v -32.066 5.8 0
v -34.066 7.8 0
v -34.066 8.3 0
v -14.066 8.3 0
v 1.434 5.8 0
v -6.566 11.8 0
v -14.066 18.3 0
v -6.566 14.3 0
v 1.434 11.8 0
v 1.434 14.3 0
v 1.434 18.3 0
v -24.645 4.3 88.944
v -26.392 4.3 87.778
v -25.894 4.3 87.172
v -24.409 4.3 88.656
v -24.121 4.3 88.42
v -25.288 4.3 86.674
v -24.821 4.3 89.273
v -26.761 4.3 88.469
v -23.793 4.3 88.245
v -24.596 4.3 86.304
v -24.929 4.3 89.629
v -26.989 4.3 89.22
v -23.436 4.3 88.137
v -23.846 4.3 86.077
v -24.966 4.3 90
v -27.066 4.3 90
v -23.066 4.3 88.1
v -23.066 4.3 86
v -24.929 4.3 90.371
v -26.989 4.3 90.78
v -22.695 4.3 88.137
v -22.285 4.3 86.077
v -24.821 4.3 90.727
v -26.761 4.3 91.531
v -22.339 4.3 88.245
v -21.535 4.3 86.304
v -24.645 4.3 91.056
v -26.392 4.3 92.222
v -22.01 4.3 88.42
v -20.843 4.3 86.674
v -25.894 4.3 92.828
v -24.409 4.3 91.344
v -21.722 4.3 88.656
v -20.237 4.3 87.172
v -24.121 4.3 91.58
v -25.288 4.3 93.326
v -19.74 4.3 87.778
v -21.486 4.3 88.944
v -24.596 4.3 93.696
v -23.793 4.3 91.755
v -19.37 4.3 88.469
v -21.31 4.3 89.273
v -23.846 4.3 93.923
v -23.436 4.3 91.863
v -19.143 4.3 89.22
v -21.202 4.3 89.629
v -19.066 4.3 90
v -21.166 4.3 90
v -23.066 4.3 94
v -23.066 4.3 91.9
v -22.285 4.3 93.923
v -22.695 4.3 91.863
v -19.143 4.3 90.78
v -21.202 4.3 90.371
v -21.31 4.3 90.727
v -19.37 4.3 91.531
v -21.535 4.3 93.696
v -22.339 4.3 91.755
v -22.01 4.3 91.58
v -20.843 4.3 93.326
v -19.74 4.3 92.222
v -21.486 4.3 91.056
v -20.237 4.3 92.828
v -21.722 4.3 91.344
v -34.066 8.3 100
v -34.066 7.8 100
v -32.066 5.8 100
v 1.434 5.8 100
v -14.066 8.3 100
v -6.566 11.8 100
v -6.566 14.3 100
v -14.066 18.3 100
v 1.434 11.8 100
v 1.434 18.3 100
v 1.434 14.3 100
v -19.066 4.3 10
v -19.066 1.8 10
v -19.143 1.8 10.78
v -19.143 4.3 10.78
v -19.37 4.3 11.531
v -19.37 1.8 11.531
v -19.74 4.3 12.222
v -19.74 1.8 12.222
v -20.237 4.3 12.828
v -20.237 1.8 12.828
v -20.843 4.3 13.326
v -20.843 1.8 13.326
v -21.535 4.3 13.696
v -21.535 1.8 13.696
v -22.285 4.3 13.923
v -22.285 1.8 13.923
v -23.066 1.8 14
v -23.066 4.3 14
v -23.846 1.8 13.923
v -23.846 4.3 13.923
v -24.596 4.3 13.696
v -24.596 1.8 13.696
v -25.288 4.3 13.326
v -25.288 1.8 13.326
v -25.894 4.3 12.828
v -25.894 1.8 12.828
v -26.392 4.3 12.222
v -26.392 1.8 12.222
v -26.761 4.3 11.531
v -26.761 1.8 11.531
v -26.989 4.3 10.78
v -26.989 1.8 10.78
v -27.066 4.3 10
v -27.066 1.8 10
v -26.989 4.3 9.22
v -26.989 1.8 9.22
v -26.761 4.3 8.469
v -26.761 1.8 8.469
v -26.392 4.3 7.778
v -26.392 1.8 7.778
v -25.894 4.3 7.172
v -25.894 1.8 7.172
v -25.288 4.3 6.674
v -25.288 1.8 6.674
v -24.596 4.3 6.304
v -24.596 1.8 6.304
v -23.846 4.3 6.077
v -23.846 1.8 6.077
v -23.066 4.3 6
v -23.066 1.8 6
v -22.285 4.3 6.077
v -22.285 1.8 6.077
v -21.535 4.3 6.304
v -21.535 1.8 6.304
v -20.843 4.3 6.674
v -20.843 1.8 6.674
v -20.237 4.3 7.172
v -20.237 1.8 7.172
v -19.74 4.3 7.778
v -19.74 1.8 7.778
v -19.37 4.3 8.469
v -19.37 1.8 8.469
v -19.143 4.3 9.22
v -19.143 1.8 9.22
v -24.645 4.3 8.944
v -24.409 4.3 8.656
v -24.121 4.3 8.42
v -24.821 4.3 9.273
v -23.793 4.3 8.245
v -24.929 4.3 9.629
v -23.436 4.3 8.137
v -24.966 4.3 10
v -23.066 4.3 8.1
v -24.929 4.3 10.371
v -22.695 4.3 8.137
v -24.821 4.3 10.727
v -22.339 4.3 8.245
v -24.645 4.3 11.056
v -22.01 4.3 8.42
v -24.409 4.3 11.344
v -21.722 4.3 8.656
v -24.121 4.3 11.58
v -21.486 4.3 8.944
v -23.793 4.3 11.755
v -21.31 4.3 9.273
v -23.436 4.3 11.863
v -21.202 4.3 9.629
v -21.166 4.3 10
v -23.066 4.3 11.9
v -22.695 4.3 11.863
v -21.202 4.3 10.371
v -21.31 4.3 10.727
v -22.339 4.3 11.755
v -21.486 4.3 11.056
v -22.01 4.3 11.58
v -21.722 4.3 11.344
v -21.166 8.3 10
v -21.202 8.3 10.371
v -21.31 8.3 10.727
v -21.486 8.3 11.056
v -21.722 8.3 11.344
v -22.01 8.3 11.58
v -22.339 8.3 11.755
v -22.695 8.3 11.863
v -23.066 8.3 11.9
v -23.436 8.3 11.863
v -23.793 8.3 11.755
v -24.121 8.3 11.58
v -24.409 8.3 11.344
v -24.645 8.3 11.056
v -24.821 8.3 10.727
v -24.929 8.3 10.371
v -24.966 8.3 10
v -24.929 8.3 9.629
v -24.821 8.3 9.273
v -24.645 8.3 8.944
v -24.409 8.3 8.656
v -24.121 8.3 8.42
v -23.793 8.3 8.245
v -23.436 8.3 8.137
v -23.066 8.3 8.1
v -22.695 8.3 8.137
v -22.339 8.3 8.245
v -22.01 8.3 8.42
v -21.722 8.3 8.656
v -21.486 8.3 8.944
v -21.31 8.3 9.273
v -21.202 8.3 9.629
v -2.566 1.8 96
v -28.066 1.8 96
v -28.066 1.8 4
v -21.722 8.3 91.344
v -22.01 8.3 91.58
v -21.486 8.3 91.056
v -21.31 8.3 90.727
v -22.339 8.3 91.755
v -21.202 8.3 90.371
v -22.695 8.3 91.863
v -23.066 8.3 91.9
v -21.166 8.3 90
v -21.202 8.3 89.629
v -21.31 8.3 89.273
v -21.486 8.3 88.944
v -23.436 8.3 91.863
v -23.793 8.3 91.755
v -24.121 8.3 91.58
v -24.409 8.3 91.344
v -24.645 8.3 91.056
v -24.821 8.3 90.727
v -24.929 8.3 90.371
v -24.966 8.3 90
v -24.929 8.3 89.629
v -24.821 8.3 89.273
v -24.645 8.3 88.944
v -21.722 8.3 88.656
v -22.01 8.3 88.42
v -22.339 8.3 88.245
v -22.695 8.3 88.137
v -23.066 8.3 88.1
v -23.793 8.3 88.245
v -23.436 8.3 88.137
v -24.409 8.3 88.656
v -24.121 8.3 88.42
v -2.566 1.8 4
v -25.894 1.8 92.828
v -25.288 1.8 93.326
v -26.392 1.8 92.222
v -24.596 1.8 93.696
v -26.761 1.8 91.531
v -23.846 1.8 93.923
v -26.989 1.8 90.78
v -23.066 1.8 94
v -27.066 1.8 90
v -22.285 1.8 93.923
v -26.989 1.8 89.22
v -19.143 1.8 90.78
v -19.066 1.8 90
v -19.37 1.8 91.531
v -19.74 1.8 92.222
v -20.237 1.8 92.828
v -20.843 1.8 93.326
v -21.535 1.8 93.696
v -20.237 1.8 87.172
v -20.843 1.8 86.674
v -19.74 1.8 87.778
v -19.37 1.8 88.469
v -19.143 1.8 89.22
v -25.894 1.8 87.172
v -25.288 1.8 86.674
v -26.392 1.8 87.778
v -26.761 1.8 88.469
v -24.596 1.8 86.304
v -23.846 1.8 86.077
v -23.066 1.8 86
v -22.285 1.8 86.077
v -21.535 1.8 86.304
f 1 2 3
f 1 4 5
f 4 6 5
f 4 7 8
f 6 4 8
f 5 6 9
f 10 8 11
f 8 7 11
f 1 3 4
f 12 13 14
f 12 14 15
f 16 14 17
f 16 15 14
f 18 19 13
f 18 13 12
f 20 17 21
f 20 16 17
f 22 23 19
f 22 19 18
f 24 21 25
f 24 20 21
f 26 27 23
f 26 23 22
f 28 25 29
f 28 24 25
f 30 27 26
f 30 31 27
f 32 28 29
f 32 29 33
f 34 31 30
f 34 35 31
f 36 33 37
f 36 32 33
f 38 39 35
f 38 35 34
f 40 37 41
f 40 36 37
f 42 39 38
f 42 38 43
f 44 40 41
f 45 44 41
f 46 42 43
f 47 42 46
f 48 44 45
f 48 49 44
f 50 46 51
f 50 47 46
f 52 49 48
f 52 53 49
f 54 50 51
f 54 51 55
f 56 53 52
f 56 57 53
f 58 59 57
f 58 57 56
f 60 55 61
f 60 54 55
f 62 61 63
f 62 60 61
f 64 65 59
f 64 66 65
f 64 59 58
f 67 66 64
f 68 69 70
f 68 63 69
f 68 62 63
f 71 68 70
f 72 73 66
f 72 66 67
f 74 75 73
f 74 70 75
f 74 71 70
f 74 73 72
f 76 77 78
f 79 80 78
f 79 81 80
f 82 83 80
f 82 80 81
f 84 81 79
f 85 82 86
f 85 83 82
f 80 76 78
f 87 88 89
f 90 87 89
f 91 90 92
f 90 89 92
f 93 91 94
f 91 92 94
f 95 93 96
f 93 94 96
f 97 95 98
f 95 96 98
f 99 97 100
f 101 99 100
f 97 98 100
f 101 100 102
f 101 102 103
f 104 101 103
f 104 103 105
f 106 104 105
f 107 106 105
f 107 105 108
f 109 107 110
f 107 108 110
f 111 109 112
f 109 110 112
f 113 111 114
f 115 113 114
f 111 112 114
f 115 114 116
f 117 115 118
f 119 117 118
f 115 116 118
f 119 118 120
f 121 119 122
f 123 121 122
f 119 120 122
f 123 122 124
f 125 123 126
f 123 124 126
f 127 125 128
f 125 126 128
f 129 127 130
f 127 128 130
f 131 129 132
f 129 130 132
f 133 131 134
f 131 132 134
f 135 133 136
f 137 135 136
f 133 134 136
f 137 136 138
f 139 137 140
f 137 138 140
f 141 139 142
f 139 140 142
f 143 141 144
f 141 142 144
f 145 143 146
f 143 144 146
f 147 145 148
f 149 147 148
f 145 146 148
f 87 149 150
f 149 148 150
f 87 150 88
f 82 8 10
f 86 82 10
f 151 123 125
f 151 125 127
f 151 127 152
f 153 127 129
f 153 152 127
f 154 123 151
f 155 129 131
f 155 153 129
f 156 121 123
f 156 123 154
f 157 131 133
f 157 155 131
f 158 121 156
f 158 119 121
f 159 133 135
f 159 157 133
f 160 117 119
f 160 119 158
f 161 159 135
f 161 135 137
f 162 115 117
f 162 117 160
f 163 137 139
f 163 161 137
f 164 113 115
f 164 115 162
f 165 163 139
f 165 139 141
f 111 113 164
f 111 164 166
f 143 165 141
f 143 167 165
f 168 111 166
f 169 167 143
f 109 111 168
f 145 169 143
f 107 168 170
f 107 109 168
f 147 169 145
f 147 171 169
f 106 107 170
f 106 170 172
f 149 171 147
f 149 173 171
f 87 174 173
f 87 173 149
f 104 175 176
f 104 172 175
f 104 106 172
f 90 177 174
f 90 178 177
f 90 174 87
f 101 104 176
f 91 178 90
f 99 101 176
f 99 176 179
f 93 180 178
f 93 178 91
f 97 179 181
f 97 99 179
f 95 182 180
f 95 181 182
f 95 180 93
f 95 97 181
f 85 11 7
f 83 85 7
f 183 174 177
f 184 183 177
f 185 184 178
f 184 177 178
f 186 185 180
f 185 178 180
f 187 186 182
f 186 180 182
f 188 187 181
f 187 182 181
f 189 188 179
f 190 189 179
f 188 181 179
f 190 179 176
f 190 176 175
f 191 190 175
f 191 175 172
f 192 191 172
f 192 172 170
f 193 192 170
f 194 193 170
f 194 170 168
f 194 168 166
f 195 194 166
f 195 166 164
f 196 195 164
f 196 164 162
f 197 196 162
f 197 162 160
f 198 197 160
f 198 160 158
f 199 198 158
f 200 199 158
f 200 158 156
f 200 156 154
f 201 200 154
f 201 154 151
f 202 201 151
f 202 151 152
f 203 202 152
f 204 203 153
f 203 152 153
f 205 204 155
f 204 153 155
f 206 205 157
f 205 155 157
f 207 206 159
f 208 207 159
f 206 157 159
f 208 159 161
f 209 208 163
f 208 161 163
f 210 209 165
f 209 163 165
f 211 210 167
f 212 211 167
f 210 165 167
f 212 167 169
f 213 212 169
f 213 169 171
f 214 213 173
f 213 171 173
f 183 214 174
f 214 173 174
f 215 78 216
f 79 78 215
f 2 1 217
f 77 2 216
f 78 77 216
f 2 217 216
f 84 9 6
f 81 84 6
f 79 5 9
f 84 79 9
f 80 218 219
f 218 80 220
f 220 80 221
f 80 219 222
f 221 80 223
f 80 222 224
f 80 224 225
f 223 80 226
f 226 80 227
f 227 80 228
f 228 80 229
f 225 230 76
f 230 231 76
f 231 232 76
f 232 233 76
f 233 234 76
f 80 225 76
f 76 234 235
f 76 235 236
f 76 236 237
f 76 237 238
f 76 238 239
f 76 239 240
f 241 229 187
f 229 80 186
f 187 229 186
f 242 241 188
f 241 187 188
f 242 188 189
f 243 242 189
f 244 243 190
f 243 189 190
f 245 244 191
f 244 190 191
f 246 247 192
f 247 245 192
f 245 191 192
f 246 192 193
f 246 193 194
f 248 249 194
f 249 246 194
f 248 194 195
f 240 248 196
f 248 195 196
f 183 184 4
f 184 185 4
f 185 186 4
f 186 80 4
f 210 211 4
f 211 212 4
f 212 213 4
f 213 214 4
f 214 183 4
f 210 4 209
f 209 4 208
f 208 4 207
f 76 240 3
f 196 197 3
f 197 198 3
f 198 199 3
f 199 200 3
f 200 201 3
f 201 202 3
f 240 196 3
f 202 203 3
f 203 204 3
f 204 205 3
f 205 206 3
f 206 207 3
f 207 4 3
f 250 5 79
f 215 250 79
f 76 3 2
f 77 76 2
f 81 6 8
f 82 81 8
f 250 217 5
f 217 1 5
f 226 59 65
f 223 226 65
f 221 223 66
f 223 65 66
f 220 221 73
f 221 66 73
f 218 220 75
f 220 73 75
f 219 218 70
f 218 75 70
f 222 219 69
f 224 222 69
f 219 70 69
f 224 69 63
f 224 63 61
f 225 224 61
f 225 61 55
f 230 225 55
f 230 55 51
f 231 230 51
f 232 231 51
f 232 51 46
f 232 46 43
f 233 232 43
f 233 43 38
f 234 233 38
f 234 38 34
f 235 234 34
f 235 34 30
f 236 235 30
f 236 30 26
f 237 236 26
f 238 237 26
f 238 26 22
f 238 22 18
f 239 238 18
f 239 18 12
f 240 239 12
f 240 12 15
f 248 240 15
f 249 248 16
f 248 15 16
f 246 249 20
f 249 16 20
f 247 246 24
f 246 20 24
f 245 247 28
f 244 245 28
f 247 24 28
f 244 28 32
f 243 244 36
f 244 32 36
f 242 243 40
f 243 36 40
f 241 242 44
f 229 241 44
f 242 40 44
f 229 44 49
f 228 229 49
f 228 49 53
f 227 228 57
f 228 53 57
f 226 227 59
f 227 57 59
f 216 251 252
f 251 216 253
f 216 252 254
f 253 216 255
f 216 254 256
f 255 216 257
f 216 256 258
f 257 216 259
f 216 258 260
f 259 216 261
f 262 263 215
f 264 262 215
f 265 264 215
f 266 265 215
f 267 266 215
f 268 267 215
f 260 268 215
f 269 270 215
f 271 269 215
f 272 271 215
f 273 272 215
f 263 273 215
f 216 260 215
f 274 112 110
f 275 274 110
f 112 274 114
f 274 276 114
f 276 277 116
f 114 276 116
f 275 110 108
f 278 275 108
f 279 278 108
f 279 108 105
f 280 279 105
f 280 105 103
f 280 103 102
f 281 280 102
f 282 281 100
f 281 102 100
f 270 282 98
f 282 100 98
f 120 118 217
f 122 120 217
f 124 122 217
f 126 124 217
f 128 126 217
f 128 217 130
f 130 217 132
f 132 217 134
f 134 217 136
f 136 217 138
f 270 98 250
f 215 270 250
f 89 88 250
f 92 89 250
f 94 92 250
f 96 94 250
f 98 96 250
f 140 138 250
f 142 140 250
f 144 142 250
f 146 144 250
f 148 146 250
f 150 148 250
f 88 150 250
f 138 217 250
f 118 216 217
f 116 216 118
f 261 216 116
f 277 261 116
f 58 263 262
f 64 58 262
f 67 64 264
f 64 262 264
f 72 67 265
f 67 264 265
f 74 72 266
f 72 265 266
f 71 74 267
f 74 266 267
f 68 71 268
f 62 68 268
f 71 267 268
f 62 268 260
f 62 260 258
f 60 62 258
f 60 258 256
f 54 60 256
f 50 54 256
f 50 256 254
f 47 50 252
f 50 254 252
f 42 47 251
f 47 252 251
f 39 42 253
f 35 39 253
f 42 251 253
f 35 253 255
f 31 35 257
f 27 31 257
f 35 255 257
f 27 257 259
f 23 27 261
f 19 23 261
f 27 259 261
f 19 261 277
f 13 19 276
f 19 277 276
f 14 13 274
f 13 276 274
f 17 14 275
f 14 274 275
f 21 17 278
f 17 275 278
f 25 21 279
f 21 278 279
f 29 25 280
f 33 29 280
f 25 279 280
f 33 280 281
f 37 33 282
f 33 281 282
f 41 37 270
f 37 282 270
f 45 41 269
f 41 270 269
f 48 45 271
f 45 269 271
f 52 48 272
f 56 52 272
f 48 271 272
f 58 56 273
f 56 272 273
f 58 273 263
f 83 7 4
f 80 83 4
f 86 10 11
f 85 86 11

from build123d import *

# Parameters (mm, degrees)
F1_DEPTH = 100
F2_SIZE  = 4
F3_SIZE  = 6
F4_R     = 1.9
F5_DEPTH = 8
F6_R     = 4
F7_DEPTH = 2.5


with BuildPart() as f1:
    # F0 (on Top) → F1 (new body)
    with BuildSketch(Plane.XY):
        Polygon((-14.065653, 8.299918), (-34.065653, 8.299918), (-34.065653, 1.799918), (1.434347, 1.799918), (1.434347, 11.799918), (-6.565653, 11.799918), (-6.565653, 14.299918), (1.434347, 14.299918), (1.434347, 18.299918), (-14.065653, 18.299918), align=None)
    extrude(amount=F1_DEPTH)

    # F2
    f2_edges = [f1.edges().sort_by_distance(p)[0] for p in [
        (-16.315653, 1.799918, 100),
        (-16.315653, 1.799918, 0),
        (1.434347, 1.799918, 50),
    ]]
    chamfer(f2_edges, length=F2_SIZE)

    # F3
    f3_edges = [f1.edges().sort_by_distance(p)[0] for p in [
        (-34.065653, 1.799918, 50),
    ]]
    chamfer(f3_edges, length=F3_SIZE)

    # F4 (on face) → F5 (cut)
    with BuildSketch(Plane.XZ.offset(-1.799918)):
        with Locations((-23.065653, 90)):
            Circle(F4_R)
        with Locations((-23.065653, 10)):
            Circle(F4_R)
    extrude(amount=-F5_DEPTH, mode=Mode.SUBTRACT)

    # F6 (on face) → F7 (cut)
    with BuildSketch(Plane.XZ.offset(-1.799918)):
        with Locations((-23.065653, 90)):
            Circle(F6_R)
        with Locations((-23.065653, 10)):
            Circle(F6_R)
    extrude(amount=-F7_DEPTH, mode=Mode.SUBTRACT)


solid = f1.part
